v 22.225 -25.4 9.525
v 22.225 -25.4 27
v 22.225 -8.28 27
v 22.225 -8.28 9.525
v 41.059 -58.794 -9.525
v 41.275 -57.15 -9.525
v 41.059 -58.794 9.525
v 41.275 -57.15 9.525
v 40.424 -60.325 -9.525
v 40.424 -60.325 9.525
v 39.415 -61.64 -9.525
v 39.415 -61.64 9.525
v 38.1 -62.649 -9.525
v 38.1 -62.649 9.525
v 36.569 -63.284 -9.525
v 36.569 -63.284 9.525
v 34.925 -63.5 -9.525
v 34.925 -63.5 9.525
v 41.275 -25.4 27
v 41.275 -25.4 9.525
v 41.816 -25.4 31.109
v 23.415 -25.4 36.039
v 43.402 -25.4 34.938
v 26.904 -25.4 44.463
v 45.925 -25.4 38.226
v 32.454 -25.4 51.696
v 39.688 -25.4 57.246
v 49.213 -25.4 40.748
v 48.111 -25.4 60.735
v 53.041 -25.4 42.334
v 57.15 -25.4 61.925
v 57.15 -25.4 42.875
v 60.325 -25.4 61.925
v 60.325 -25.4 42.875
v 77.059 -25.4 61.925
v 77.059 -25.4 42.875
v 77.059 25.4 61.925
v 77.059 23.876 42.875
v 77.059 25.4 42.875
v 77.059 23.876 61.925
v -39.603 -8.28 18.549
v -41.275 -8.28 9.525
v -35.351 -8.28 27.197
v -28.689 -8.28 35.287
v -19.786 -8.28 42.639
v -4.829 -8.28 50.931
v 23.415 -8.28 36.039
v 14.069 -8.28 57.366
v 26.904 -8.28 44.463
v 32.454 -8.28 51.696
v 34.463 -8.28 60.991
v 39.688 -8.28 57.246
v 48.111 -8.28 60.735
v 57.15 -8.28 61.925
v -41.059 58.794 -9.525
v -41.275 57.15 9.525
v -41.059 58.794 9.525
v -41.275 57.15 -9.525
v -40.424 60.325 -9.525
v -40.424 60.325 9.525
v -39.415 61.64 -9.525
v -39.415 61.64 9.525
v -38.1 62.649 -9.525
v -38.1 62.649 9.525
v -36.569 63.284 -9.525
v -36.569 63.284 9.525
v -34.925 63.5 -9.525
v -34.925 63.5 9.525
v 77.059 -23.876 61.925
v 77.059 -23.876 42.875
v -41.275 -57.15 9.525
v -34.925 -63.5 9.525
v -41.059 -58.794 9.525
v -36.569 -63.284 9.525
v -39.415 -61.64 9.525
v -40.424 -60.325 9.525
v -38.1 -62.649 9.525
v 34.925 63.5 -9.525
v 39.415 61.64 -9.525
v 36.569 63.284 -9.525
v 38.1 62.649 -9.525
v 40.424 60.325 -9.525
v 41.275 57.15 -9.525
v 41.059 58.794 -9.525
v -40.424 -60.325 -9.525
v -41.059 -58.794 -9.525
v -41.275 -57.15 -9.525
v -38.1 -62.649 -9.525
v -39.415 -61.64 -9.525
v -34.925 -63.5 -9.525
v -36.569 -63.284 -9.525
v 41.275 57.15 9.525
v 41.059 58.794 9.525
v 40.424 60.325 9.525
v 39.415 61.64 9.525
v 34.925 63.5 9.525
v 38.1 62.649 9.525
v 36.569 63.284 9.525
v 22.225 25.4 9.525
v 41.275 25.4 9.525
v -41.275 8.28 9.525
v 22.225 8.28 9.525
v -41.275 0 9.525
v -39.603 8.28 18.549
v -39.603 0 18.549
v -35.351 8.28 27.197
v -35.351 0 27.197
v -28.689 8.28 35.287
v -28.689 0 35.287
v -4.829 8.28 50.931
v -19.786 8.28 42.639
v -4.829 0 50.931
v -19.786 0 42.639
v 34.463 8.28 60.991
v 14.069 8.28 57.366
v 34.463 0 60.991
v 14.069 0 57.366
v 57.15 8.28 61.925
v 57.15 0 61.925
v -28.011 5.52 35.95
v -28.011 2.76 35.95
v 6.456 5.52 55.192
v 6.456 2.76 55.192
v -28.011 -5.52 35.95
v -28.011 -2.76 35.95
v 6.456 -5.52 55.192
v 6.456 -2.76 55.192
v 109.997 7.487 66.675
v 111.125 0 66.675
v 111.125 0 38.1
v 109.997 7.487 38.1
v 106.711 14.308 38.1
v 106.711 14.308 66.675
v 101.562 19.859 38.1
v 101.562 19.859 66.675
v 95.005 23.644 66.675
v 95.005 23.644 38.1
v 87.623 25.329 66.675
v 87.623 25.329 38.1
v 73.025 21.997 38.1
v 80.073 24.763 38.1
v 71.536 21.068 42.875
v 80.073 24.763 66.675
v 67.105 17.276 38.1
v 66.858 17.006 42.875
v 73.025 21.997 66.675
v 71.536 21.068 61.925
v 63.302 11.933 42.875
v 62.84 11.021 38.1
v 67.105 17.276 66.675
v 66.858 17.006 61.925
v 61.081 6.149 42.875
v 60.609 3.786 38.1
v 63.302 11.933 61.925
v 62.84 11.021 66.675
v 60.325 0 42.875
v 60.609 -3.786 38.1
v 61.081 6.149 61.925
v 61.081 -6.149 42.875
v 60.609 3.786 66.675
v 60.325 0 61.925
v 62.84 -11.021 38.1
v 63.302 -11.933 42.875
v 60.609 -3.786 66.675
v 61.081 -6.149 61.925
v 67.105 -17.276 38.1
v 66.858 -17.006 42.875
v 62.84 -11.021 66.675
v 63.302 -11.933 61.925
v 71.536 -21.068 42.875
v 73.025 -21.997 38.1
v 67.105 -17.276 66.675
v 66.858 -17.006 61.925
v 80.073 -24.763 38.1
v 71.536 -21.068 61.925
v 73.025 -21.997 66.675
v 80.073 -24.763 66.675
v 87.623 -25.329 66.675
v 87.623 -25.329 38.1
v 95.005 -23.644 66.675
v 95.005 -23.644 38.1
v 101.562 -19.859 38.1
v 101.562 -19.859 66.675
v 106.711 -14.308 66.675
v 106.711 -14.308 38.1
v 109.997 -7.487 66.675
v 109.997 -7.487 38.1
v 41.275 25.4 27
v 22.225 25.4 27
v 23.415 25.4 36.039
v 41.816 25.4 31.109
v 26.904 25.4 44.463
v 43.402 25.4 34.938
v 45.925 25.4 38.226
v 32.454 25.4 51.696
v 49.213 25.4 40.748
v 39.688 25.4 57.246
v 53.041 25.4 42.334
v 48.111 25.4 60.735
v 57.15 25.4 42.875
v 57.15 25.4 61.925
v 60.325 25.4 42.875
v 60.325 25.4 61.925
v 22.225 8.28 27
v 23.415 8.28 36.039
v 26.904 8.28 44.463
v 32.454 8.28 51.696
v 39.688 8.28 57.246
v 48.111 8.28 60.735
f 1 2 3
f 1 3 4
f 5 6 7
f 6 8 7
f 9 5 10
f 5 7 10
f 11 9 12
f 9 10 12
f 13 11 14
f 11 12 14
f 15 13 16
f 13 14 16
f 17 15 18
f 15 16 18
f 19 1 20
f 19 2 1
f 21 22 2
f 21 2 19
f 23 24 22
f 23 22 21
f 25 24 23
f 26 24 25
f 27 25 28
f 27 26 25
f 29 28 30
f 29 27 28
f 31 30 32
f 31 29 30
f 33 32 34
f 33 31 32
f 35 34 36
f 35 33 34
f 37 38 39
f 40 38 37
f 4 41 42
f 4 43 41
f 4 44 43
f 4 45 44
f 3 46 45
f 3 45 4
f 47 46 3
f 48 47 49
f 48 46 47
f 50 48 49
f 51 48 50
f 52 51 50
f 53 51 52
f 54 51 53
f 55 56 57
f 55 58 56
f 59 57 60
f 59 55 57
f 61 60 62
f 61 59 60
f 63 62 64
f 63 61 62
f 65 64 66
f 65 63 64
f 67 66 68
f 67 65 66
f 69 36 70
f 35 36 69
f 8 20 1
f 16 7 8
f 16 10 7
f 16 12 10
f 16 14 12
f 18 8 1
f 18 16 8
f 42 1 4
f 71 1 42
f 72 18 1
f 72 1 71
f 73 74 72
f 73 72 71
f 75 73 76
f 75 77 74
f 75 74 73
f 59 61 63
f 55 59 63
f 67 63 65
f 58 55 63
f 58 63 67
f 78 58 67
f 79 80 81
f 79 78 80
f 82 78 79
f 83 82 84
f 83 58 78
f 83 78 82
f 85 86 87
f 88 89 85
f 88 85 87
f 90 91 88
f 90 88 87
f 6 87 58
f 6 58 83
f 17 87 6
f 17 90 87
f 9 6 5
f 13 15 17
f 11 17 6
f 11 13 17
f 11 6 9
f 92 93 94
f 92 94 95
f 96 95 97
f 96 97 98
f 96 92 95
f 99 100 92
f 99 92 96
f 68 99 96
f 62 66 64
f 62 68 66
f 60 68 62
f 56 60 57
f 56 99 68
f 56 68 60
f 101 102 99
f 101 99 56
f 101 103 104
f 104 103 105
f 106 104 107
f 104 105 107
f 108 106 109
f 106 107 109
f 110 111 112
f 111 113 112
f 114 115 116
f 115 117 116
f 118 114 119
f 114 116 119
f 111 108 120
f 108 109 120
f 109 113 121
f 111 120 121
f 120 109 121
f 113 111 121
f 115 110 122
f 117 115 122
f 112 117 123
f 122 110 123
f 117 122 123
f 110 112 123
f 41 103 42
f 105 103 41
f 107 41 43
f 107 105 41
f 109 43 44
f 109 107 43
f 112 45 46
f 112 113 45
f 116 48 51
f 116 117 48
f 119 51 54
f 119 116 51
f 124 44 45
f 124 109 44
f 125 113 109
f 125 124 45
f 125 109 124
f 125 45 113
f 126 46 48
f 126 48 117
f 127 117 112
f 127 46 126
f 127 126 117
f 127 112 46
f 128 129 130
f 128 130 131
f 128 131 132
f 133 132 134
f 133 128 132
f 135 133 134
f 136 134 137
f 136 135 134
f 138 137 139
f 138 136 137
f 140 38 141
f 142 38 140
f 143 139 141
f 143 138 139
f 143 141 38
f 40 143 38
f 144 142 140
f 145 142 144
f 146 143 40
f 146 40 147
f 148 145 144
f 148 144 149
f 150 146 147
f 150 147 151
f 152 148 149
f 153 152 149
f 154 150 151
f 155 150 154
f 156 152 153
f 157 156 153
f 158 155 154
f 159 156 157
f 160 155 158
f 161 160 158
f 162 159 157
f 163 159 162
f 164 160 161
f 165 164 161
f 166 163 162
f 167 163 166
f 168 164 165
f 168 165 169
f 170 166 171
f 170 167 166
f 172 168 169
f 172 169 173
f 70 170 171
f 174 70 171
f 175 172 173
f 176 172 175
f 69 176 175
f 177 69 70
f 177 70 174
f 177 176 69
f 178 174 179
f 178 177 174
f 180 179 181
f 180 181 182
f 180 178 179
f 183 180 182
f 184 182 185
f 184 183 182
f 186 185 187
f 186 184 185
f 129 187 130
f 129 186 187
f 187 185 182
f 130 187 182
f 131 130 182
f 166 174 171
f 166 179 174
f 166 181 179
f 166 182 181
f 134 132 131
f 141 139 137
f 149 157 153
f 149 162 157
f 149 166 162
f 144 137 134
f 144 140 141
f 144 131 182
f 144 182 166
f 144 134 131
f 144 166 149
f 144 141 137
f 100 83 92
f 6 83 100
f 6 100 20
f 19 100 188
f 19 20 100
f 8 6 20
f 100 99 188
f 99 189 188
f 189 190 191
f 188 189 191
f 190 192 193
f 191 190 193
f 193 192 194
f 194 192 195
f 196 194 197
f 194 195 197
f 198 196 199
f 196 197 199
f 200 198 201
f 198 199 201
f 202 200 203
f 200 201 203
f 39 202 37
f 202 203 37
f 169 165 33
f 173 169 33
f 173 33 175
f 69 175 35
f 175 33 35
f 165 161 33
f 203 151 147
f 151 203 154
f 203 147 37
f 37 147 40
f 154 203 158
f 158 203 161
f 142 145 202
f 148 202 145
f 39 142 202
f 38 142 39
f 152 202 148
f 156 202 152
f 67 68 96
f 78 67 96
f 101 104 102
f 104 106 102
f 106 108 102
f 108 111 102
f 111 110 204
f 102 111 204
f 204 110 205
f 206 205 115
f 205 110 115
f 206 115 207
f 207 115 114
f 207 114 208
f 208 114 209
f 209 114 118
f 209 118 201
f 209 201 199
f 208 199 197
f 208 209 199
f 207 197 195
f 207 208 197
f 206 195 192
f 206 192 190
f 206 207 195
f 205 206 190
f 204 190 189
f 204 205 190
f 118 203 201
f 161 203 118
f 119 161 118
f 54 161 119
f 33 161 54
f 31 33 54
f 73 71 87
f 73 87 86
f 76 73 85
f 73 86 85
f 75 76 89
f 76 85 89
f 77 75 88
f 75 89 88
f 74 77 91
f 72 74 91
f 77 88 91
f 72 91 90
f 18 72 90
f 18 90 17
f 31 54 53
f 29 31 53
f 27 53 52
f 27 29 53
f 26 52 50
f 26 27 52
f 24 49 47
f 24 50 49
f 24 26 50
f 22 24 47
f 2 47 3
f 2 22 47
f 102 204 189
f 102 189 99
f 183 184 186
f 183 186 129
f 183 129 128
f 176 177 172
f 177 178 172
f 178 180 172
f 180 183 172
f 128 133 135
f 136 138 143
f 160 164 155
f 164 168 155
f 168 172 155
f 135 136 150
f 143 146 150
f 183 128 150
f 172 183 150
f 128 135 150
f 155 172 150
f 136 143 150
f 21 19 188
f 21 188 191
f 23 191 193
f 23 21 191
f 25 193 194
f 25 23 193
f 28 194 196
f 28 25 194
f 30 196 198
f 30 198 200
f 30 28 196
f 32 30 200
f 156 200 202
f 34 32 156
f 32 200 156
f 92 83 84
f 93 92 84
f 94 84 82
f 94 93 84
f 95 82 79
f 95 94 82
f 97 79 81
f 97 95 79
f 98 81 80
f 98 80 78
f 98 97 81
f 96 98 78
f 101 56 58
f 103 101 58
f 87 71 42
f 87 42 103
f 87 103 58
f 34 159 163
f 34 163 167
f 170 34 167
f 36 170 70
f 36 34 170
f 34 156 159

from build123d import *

# Parameters (mm, degrees)
F1_DEPTH = 63.5
F0_W     = 16.733868
F0_H     = 19.049999
F2_DEPTH = 25.4
F3_DEPTH = 8.2804
F0_W_2   = 25.4
F0_H_2   = 28.575
F5_R     = 6.35


with BuildPart() as f1:
    # F0 (on Front) → F1 (new body, symmetric)
    with BuildSketch(Plane.XZ):
        Polygon((41.275, -9.525), (41.275, 9.525), (22.225001, 9.525), (-41.275, 9.525), (-41.275, -9.525), align=None)
    extrude(amount=F1_DEPTH, both=True)

    # F0 (on Front) → F2 (join, symmetric)
    with BuildSketch(Plane.XZ):
        with BuildLine():
            Line((22.225001, 9.525), (41.275, 9.525))
            Line((41.275, 9.525), (41.275, 27.0002))
            ThreePointArc((41.275, 27.0002), (45.92468, 38.22552), (57.15, 42.8752))
            Line((57.15, 42.8752), (60.325, 42.8752))
            Line((60.325, 42.8752), (60.325, 61.925199))
            Line((60.325, 61.925199), (57.15, 61.925199))
            ThreePointArc((57.15, 61.925199), (32.454296, 51.695904), (22.225001, 27.0002))
            Line((22.225001, 27.0002), (22.225001, 9.525))
        make_face()
        with Locations((68.691934, 52.400199)):
            Rectangle(F0_W, F0_H)
    extrude(amount=F2_DEPTH, both=True)

    # F0 (on Front) → F3 (join, symmetric)
    with BuildSketch(Plane.XZ):
        with BuildLine():
            Line((-41.275, 9.525), (22.225001, 9.525))
            Line((22.225001, 9.525), (22.225001, 27.0002))
            ThreePointArc((22.225001, 27.0002), (32.454296, 51.695904), (57.15, 61.925199))
            add(Edge.make_bspline(
                [(-41.275, 9.525), (-40.269591, 37.765782), (0, 63.221171), (57.15, 61.925199)],
                knots=[0, 0, 0, 0, 111.504536, 111.504536, 111.504536, 111.504536], degree=3))
        make_face()
    extrude(amount=F3_DEPTH, both=True)

    # F0 (on Front) → F4 (revolve)
    with BuildSketch(Plane.XZ):
        with Locations((98.425, 52.3875)):
            Rectangle(F0_W_2, F0_H_2)
    revolve(axis=Axis((85.725, 0, 52.3875), (0, 0, 1)))

    # F5
    f5_edges = [f1.edges().sort_by_distance(p)[0] for p in [
        (41.275, -63.5, 0),
        (-41.275, -63.5, 0),
        (41.275, 63.5, 0),
        (-41.275, 63.5, 0),
    ]]
    fillet(f5_edges, radius=F5_R)


solid = f1.part
